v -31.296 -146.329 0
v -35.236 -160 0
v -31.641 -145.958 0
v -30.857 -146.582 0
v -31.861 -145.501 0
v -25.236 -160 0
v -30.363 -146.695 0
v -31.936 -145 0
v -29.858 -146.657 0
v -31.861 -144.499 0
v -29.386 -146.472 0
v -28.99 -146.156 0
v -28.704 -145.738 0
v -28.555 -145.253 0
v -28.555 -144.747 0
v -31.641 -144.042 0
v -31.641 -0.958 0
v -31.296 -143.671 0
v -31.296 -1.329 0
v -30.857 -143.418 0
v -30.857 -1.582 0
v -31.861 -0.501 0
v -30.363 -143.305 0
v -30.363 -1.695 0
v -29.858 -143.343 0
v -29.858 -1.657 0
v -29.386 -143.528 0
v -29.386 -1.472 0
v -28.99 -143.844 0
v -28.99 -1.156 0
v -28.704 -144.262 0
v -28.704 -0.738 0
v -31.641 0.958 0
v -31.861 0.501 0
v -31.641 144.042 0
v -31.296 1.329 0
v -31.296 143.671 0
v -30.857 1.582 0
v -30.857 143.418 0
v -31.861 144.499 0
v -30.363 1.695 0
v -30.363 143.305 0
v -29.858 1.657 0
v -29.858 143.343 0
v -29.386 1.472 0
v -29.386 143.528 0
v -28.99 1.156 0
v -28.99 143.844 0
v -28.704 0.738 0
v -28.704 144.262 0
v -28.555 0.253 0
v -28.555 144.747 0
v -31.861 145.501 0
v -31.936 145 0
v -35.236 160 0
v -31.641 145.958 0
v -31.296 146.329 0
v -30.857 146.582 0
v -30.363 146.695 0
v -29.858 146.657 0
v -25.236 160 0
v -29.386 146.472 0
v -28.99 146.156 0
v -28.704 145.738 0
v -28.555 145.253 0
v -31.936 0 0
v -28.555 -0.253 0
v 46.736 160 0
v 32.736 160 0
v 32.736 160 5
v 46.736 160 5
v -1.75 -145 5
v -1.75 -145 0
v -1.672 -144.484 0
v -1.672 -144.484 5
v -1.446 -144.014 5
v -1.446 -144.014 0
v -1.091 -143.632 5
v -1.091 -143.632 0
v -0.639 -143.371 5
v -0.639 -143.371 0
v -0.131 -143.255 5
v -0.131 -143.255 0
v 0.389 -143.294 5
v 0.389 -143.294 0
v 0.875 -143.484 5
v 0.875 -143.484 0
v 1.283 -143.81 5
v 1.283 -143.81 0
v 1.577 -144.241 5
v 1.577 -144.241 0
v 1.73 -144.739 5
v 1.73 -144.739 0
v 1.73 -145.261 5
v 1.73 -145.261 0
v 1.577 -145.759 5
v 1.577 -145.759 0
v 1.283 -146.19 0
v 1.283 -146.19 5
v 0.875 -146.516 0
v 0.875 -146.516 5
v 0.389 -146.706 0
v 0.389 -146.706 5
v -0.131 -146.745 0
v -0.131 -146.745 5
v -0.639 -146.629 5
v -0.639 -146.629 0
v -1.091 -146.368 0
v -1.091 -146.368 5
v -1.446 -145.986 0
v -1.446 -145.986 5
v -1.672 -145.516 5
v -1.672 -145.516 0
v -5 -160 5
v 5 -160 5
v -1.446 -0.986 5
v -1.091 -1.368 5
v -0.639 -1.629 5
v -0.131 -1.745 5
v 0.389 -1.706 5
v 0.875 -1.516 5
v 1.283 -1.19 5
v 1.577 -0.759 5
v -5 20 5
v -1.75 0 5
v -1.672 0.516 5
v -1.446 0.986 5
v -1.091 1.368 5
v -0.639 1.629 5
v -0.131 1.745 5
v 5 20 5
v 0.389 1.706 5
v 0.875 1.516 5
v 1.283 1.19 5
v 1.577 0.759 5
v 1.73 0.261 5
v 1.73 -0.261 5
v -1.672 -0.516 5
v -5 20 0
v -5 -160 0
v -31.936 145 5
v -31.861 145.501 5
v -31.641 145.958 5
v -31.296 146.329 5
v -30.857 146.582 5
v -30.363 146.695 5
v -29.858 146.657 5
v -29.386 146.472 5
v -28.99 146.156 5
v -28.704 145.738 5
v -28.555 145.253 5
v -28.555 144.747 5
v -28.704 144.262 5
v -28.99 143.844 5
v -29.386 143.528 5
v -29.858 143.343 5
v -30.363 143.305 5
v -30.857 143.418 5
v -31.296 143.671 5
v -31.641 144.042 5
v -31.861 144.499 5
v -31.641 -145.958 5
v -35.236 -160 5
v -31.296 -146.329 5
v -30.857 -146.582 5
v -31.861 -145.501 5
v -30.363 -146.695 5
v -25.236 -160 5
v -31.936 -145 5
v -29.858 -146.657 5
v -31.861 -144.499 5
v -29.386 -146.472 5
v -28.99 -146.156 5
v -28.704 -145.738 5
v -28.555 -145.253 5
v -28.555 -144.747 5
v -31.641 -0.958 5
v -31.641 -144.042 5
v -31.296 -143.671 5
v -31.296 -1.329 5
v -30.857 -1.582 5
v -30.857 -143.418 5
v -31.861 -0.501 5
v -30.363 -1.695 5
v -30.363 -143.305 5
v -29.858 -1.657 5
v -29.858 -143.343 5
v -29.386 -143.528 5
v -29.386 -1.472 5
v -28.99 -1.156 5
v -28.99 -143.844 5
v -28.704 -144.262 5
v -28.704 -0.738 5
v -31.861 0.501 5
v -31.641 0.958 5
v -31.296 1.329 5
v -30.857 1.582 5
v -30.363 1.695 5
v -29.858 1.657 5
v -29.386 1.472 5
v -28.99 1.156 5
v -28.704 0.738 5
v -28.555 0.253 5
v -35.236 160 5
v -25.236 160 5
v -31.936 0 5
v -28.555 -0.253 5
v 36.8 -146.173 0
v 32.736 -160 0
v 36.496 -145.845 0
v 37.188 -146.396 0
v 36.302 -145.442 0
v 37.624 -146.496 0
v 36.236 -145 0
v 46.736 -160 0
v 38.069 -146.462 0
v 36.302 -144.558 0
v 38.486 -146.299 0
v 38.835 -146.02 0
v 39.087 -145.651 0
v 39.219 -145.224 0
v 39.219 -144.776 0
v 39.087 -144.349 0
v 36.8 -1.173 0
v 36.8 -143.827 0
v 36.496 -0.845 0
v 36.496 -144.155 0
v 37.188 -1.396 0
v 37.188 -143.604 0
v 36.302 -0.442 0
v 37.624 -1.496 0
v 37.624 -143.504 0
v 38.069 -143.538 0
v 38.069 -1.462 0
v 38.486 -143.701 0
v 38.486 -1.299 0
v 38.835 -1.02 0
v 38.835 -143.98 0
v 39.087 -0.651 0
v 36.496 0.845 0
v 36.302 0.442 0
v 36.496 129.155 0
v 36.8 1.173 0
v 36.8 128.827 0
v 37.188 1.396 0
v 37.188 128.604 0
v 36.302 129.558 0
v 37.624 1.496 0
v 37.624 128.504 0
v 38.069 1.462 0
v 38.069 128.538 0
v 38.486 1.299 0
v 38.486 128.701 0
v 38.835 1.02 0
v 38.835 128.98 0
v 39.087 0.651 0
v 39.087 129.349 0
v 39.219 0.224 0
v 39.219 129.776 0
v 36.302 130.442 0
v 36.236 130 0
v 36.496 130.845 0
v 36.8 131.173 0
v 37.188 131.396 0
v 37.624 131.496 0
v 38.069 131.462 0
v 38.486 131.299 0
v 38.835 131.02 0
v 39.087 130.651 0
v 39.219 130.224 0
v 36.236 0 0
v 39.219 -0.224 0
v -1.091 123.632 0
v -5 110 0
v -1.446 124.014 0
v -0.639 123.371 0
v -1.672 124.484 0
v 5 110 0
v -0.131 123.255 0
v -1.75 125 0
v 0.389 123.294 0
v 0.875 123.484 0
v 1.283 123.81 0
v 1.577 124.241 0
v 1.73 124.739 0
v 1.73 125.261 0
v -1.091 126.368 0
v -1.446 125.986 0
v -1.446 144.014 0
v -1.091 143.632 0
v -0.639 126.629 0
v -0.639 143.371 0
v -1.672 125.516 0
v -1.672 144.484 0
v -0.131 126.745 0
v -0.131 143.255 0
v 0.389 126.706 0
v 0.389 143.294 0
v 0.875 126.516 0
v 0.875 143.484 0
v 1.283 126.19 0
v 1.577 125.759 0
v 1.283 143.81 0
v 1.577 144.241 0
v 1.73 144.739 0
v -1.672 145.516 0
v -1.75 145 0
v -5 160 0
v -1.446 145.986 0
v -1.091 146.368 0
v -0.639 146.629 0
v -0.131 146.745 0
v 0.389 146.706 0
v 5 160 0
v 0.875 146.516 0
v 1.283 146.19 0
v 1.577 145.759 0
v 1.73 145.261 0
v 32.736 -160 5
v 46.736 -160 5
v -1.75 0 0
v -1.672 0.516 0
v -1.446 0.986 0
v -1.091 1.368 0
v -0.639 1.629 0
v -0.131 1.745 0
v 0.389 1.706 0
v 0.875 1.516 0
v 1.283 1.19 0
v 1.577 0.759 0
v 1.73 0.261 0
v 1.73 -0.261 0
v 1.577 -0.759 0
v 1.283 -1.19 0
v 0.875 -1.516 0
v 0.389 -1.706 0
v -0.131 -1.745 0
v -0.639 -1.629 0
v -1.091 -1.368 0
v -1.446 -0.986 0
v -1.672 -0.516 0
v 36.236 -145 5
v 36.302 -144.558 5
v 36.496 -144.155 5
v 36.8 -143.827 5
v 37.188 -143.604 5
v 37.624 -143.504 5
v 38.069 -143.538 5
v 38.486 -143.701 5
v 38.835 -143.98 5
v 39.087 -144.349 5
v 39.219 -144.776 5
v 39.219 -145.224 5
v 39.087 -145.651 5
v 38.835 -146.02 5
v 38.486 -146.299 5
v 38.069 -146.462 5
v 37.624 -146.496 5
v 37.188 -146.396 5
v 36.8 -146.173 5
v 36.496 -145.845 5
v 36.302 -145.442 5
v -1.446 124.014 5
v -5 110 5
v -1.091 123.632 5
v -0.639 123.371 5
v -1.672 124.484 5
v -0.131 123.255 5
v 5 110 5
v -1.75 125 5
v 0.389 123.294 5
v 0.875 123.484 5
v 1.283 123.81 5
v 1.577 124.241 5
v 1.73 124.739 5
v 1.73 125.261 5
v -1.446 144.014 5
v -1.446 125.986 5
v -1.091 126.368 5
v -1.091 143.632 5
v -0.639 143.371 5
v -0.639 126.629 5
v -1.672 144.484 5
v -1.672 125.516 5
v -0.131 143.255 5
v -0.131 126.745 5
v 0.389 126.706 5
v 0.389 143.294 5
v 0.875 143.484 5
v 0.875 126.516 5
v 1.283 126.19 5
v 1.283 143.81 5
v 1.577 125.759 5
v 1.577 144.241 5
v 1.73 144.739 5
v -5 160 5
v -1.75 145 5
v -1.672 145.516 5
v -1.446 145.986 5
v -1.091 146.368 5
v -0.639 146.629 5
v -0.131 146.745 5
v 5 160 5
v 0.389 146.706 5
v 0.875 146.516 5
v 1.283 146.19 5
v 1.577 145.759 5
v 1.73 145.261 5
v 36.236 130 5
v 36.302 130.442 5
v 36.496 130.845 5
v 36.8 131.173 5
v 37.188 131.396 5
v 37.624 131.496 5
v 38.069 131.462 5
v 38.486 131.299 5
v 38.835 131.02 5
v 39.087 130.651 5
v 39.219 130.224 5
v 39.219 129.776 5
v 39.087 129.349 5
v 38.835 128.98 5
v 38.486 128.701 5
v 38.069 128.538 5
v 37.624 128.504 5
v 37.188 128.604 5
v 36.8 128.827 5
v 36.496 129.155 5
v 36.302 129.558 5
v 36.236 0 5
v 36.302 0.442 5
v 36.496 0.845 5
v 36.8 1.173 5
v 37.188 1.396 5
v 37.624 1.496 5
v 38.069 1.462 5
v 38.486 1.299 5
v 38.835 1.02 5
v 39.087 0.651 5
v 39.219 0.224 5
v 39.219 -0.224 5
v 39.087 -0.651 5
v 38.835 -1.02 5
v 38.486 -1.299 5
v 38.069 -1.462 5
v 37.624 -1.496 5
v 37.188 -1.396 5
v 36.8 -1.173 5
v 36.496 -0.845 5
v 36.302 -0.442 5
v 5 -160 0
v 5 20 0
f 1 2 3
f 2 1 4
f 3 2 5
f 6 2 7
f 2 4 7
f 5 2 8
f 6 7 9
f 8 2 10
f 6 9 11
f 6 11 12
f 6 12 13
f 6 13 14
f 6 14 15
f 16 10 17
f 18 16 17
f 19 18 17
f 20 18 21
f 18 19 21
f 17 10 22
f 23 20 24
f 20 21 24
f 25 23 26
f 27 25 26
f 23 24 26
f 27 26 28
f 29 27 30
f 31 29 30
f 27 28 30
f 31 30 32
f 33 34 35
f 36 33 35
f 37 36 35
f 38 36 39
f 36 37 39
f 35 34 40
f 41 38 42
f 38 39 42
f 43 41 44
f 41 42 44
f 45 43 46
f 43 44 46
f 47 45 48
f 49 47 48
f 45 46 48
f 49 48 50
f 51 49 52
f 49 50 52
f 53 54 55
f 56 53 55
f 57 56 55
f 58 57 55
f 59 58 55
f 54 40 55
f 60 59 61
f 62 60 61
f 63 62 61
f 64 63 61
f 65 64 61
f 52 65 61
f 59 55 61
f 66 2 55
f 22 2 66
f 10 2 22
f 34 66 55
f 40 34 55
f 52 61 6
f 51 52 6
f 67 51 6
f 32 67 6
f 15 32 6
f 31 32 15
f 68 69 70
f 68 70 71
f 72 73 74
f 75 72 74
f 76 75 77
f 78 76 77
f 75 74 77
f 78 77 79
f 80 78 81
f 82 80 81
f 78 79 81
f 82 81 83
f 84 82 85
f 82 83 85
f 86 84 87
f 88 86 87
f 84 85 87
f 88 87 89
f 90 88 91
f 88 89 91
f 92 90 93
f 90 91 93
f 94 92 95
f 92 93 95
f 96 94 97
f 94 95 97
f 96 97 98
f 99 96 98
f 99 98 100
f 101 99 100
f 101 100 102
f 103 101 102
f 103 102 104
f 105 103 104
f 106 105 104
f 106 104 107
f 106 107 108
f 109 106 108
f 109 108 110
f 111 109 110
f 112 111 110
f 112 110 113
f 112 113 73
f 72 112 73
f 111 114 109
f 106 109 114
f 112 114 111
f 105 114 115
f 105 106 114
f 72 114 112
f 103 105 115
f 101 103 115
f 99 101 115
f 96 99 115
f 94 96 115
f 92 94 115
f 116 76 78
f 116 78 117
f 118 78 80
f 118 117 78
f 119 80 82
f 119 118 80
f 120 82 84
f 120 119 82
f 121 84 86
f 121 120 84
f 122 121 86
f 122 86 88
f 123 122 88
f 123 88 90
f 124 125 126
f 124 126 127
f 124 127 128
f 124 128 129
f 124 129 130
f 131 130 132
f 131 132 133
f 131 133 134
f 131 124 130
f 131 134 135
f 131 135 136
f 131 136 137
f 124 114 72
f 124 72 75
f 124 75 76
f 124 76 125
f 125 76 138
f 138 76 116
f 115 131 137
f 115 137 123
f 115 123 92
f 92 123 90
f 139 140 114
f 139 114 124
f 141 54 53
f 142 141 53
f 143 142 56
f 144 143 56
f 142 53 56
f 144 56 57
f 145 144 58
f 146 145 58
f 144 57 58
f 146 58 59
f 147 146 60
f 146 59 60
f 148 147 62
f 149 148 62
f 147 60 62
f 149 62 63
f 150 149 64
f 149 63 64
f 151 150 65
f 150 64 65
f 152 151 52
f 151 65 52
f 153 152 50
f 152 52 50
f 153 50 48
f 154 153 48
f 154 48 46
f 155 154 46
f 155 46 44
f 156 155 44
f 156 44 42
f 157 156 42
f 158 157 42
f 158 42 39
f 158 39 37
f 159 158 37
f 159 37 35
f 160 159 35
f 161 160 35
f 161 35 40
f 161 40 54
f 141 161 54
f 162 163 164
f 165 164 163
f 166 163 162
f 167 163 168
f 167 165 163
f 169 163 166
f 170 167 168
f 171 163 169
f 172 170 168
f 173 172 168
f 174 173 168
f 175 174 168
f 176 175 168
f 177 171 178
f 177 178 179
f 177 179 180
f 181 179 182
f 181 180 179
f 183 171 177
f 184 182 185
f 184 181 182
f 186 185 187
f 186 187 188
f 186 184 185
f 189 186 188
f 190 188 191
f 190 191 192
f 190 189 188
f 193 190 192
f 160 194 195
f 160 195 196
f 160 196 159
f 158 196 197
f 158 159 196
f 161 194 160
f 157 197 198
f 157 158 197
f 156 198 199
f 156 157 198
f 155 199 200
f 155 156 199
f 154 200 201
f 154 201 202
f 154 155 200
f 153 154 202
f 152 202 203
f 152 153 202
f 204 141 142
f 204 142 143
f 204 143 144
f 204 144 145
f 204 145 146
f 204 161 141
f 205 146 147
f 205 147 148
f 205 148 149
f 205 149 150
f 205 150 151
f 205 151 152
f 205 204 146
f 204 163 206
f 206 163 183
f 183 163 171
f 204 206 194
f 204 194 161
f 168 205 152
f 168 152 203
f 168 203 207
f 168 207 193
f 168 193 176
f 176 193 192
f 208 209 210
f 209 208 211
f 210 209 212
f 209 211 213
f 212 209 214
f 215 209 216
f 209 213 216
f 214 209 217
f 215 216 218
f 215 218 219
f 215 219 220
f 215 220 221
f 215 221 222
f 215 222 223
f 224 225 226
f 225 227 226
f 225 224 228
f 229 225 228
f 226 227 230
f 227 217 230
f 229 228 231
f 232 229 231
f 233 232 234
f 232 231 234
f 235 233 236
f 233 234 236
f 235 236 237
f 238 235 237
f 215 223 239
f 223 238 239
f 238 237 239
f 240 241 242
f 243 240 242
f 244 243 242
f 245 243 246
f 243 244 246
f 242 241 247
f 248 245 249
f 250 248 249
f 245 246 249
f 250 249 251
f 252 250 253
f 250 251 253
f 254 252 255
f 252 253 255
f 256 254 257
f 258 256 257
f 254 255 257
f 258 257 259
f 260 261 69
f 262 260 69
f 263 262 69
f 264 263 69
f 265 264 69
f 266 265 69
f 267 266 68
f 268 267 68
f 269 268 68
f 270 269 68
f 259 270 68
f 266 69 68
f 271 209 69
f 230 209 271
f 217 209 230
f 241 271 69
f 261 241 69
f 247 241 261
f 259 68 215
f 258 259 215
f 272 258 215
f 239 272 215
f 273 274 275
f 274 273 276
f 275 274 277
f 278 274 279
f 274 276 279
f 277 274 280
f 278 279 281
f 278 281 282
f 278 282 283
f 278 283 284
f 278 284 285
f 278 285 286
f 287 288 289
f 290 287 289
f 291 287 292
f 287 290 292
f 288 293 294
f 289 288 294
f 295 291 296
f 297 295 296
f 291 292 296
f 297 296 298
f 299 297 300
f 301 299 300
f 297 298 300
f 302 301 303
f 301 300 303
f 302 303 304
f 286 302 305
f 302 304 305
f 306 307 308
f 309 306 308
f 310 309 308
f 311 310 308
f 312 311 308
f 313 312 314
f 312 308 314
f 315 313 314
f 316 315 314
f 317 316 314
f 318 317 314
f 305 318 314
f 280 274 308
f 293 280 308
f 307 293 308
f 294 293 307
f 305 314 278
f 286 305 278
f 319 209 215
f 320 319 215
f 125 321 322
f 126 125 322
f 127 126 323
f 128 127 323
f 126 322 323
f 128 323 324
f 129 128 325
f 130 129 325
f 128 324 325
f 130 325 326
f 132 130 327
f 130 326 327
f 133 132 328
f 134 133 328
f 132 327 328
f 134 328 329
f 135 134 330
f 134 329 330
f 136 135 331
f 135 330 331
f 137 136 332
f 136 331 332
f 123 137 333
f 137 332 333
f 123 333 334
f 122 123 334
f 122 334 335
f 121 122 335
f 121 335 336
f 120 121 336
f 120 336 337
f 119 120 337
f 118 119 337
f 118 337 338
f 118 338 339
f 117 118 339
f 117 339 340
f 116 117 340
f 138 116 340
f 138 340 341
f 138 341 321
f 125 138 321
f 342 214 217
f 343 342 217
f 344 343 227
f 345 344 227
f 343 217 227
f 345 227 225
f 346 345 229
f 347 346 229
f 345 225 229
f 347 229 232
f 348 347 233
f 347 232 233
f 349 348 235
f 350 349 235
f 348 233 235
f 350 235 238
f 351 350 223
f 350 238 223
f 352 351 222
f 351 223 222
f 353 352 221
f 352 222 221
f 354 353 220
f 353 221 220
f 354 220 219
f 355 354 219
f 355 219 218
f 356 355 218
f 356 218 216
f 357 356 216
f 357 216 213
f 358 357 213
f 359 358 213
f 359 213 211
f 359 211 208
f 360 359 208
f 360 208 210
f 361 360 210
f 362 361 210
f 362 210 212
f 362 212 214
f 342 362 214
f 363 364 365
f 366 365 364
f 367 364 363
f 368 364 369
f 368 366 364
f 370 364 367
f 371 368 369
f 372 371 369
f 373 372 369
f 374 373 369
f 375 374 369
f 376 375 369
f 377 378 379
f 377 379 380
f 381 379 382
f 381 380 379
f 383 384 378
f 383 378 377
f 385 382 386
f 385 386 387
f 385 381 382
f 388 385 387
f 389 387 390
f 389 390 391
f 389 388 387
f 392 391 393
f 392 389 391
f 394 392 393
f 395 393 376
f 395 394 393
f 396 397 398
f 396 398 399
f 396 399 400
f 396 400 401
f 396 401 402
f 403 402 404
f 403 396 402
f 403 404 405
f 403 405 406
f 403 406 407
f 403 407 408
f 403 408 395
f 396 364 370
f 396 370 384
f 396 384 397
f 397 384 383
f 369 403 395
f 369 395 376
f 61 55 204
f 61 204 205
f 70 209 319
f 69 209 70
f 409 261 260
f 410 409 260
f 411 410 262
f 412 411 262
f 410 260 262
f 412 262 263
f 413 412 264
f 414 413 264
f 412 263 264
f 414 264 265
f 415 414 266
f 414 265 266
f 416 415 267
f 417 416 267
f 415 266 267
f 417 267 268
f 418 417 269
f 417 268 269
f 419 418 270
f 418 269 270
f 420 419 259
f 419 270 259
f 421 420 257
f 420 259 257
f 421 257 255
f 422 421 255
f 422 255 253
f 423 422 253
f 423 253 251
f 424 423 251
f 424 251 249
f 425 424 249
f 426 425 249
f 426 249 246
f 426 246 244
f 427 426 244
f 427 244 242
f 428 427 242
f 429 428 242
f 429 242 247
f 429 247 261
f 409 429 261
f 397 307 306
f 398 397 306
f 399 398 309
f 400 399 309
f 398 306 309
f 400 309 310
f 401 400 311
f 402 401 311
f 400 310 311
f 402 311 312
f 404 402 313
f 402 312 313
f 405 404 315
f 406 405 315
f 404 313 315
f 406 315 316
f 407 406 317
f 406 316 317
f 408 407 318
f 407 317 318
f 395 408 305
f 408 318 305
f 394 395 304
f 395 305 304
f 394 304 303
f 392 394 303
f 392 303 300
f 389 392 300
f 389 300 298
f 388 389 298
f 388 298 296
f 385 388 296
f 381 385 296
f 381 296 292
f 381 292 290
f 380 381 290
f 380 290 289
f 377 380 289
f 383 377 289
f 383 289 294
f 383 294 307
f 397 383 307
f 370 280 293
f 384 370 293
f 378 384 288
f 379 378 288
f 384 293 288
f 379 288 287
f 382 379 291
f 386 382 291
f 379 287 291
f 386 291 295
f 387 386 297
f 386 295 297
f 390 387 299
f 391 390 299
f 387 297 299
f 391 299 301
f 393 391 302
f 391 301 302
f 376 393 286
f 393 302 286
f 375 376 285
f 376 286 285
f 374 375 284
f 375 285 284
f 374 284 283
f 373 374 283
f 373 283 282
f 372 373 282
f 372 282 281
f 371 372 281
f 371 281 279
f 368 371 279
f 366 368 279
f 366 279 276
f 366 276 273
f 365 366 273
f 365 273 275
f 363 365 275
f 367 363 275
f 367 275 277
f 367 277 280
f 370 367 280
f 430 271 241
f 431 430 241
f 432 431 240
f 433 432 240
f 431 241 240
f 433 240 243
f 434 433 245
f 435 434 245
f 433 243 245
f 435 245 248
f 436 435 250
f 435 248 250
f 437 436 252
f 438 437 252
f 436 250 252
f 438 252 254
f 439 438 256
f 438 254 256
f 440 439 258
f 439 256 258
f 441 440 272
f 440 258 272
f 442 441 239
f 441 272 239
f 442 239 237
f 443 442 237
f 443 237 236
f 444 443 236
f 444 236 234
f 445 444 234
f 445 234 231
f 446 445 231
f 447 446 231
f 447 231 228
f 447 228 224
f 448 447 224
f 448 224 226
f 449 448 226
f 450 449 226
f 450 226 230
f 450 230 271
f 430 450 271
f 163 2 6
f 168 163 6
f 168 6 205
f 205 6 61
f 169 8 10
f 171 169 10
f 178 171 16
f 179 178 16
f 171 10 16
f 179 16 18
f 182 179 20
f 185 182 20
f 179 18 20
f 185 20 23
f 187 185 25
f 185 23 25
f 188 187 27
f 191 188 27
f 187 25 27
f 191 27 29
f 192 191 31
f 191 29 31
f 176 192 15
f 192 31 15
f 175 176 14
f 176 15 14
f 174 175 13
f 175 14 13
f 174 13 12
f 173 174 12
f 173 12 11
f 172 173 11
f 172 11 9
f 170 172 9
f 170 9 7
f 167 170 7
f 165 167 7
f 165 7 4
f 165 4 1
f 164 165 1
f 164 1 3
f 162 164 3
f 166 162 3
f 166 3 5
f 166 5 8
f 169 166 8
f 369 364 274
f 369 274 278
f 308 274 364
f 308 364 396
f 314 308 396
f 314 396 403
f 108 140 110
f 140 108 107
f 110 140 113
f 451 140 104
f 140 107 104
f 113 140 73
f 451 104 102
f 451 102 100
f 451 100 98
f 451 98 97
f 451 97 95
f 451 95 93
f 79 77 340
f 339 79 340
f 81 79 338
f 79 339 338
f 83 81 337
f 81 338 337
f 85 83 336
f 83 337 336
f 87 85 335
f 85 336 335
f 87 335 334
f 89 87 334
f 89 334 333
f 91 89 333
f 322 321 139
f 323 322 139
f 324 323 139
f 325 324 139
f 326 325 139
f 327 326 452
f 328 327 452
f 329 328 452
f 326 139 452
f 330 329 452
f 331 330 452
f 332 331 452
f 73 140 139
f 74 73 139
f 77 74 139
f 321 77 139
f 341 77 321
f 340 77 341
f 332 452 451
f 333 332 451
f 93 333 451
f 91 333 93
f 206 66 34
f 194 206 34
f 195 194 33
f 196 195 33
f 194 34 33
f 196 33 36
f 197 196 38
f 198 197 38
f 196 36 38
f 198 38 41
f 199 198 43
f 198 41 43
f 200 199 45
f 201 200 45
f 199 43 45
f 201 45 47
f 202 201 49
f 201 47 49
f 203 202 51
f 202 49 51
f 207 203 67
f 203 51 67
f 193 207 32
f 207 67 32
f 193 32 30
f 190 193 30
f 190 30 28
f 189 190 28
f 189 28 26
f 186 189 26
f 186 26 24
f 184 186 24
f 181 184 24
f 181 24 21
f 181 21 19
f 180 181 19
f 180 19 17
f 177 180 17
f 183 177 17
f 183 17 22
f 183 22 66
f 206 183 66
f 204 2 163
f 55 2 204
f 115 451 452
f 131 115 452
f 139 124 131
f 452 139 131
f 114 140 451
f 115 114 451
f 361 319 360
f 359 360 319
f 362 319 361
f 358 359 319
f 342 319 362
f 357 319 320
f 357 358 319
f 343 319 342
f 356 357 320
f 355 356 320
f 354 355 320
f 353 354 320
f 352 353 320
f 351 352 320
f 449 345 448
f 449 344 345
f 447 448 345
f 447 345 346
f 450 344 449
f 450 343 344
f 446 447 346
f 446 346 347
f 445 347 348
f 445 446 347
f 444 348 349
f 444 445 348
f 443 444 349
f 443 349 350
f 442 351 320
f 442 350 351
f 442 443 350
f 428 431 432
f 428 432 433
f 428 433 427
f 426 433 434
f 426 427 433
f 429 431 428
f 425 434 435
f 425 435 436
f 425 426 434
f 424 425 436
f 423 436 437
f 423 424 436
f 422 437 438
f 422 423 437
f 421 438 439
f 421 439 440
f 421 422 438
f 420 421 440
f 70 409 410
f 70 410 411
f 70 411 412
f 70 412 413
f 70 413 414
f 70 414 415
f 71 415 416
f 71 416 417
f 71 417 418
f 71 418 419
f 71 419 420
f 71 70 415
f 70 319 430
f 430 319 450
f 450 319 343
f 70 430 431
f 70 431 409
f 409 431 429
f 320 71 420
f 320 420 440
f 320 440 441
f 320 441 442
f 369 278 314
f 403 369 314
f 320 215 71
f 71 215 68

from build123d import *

# Parameters (mm, degrees)
F0_W      = 10
F0_H      = 320
F1_DEPTH  = 5
F3_D      = 3.5
F4_W      = 14
F4_H      = 320
F5_DEPTH  = 5
F7_D      = 3
F8_W      = 10
F8_H      = 90
F9_DEPTH  = 25
F10_W     = 10
F10_H     = 320
F11_DEPTH = 5
F13_D     = 3.4


with BuildPart() as f1:
    # F0 (on Top) → F1 (new body)
    with BuildSketch(Plane.XY):
        Rectangle(F0_W, F0_H)
    extrude(amount=F1_DEPTH)

    # F3 (through all)
    with Locations(Plane.XY.offset(5)):
        with Locations((0, 145), (0, 0), (0, -145), (0, 125)):
            Hole(F3_D / 2)

    # F8 (on face) → F9 (cut)
    with BuildSketch(Plane.XY.offset(5)):
        with Locations((0, 65)):
            Rectangle(F8_W, F8_H)
    extrude(amount=-F9_DEPTH, mode=Mode.SUBTRACT)


with BuildPart() as f5:
    # F4 (on Top) → F5 (new body)
    with BuildSketch(Plane.XY):
        with Locations((39.735682, 0)):
            Rectangle(F4_W, F4_H)
    extrude(amount=F5_DEPTH)

    # F7 (through all)
    with Locations(Plane.XY.offset(5)):
        with Locations((37.735682, 130), (37.735682, 0), (37.735682, -145)):
            Hole(F7_D / 2)


with BuildPart() as f11:
    # F10 (on Top) → F11 (new body)
    with BuildSketch(Plane.XY):
        with Locations((-30.23603, 0)):
            Rectangle(F10_W, F10_H)
    extrude(amount=F11_DEPTH)

    # F13 (through all)
    with Locations(Plane.XY.offset(5)):
        with Locations((-30.23603, 145), (-30.23603, 0), (-30.23603, -145)):
            Hole(F13_D / 2)


solid = Compound([f1.part, f5.part, f11.part])
